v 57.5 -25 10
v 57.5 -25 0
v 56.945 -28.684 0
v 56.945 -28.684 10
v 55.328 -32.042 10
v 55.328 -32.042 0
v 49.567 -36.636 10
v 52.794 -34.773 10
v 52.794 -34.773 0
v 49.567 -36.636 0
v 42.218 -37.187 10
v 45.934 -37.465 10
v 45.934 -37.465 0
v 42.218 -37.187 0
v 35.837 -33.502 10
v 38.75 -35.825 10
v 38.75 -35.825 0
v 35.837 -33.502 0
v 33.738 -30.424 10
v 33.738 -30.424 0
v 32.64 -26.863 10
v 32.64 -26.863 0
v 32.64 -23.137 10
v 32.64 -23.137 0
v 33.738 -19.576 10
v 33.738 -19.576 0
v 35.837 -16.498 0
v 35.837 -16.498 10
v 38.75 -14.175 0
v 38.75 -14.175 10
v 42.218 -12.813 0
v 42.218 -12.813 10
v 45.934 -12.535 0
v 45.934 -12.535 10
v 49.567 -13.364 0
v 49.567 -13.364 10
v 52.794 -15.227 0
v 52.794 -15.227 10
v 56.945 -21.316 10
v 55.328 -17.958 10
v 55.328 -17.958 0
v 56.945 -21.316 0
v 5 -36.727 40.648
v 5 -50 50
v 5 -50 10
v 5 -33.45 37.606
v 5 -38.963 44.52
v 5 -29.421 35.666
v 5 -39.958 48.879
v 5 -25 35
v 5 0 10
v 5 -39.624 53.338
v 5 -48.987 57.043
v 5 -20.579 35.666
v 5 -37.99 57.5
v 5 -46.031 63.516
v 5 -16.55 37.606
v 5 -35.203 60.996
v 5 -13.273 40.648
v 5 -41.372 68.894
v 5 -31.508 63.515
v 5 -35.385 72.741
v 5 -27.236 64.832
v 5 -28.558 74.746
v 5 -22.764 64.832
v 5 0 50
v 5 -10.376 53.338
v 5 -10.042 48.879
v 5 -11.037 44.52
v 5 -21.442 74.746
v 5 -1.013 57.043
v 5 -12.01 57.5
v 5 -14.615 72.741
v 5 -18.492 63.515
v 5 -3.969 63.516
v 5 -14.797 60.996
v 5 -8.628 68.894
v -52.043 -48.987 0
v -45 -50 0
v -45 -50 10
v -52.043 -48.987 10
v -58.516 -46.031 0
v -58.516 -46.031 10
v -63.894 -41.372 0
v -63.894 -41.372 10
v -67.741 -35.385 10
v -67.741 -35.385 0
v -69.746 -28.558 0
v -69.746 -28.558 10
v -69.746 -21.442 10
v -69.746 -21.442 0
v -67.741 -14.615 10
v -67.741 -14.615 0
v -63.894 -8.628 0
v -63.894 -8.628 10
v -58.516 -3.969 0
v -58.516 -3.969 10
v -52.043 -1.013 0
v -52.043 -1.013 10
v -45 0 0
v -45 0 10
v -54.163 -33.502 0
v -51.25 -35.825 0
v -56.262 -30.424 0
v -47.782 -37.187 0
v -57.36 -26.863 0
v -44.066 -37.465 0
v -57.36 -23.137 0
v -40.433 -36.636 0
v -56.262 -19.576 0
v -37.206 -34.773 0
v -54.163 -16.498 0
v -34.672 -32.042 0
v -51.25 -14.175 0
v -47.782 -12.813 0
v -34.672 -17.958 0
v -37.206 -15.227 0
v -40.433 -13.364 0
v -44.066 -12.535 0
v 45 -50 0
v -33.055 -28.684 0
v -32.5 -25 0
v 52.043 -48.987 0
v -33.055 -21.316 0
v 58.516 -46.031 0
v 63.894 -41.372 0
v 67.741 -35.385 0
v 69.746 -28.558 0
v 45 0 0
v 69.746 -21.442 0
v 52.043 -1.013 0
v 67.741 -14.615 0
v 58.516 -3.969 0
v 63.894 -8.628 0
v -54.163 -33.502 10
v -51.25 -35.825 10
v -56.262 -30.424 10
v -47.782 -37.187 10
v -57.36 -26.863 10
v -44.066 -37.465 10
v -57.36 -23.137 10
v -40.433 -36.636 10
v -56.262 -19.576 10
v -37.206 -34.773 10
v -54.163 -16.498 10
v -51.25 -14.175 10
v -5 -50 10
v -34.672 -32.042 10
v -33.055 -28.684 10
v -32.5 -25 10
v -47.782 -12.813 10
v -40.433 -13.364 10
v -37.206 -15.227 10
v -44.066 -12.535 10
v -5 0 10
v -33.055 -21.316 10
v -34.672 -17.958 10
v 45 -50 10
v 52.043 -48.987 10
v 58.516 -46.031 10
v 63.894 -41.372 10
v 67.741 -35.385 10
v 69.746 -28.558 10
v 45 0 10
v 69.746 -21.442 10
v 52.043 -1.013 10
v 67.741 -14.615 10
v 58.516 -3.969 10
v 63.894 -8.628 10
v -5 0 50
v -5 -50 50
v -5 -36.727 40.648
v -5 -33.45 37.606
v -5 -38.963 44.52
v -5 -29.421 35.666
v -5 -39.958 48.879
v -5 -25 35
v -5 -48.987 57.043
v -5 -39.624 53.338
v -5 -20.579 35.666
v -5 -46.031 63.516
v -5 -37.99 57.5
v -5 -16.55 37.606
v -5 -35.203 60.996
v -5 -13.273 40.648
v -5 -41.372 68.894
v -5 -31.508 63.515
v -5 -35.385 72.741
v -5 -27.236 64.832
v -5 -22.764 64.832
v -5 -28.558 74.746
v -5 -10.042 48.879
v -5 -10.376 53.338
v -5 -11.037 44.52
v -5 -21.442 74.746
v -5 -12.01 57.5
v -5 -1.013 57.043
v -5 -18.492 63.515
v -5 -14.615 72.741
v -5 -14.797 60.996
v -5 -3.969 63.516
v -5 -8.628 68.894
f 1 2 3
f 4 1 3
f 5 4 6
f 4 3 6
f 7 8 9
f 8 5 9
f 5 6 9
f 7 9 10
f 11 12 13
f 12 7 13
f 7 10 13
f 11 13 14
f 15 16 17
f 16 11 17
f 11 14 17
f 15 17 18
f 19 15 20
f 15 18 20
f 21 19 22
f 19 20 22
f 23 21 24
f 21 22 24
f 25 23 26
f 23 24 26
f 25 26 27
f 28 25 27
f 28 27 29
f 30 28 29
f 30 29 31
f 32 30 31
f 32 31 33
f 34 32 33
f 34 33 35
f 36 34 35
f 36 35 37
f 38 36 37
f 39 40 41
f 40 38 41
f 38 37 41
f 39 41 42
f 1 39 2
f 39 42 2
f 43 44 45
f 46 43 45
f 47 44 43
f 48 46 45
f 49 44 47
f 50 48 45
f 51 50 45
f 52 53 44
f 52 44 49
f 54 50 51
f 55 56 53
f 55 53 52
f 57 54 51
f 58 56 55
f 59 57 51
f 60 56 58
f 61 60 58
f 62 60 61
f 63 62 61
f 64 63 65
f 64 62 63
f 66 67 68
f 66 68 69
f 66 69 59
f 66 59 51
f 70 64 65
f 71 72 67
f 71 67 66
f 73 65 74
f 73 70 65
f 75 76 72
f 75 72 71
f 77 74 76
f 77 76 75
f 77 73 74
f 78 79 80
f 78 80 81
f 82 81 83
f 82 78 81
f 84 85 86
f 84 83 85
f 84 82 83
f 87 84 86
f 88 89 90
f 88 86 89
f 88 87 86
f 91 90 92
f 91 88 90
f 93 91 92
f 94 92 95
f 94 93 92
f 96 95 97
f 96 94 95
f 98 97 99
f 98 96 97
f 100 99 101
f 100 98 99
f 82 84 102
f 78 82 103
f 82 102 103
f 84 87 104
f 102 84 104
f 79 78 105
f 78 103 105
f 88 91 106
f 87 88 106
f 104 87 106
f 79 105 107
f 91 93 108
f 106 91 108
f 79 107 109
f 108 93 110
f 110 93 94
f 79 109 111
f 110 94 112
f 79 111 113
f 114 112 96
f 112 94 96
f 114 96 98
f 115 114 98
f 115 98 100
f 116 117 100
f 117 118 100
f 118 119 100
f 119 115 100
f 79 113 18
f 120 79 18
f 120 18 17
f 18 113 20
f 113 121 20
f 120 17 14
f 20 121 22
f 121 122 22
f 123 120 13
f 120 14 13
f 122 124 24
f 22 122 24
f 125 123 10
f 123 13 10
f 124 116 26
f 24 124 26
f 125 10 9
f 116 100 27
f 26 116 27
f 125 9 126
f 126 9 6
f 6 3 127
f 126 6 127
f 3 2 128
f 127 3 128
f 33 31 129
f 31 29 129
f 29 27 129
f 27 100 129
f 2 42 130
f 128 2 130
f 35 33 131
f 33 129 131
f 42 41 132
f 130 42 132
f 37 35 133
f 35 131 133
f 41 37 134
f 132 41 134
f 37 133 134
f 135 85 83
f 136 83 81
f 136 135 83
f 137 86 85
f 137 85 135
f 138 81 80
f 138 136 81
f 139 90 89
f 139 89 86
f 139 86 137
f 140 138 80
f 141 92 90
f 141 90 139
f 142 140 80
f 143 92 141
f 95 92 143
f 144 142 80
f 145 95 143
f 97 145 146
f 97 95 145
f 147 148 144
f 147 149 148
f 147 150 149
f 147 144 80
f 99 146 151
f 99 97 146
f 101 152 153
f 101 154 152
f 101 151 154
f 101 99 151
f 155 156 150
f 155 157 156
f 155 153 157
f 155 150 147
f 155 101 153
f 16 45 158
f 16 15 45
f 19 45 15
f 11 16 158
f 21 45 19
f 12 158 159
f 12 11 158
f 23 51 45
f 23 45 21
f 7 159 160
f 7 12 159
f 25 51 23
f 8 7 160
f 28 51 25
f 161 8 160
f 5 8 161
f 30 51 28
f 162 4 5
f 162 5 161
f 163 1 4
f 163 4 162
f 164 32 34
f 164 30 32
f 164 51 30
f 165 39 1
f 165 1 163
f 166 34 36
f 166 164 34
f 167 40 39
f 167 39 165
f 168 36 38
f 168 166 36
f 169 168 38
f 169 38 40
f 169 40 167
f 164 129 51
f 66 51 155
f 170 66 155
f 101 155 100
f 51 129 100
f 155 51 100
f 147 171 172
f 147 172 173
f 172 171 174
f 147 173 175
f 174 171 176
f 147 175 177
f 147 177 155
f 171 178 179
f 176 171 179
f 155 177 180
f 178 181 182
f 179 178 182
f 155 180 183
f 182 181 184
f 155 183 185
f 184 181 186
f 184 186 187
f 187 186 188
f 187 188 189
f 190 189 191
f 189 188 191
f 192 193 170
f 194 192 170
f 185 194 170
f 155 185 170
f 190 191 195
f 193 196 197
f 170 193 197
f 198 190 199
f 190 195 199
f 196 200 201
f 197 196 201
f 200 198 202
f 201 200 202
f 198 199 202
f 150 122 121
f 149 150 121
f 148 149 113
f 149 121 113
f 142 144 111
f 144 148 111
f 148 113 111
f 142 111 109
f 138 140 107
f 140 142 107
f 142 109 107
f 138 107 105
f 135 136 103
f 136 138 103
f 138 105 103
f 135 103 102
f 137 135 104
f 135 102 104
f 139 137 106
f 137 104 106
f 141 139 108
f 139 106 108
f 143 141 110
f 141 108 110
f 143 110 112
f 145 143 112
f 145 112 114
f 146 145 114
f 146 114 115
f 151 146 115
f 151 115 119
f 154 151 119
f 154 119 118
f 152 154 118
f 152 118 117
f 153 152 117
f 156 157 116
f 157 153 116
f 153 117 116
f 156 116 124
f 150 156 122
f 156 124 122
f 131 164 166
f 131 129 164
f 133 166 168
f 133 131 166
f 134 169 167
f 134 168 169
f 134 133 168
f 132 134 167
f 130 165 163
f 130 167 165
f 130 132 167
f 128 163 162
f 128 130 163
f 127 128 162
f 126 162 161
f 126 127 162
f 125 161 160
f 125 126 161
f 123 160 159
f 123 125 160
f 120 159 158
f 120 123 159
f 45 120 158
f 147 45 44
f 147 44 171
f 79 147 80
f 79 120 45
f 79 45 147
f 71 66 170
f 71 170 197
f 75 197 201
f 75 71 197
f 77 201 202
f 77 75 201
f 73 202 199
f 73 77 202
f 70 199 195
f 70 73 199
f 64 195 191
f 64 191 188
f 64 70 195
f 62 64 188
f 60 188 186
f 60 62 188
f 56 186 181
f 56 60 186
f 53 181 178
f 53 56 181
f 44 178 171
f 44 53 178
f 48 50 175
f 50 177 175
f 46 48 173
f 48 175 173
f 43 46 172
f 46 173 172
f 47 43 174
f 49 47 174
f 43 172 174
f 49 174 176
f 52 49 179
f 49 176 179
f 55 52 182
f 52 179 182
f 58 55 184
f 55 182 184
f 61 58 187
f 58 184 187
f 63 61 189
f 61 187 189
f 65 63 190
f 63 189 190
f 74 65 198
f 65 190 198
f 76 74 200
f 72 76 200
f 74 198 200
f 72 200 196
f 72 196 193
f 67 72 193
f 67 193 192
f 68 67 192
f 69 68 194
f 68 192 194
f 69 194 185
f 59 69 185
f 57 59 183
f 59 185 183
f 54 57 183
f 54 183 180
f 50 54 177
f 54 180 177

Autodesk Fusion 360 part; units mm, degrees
sketch "Sketch1" plane through (0, 0, 0) normal (0, 0, 1) x (1, 0, 0)
  line L0 (-5, 0) -> (-5, -50)
  line L1 (5, 0) -> (5, -50)
  line L2 (5, 0) -> (45, 0)
  line L3 (-5, 0) -> (-45, 0)
  line L4 (5, -50) -> (45, -50)
  line L5 (-5, -50) -> (-45, -50)
  line L6 (70, -25) -> (70.7973, -25) construction
  circle A0 centre (-45, -25) radius 12.5
  circle A1 centre (45, -25) radius 12.5
  arc A2 (-45, 0) -> (-45, -50) centre (-45, -25) ccw
  arc A3 (45, -50) -> (45, 0) centre (45, -25) ccw
  line L7 (-5, 0) -> (5, 0)
  line L8 (-5, -50) -> (5, -50)
  dimension "d4" = 40
  dimension "d5" = 40
  dimension "d6" = 40
  dimension "d7" = 40
  dimension "d8" = 25
  dimension "d9" = 50
  dimension "d10" = 25
  dimension "d11" = 50
extrude "Extrude1" add sketch "Sketch1" along normal blind 10 contours L0 L3 L5 A2 | L1 L2 L4 A3 makes body 1 at (-14.1667, -25, 0) makes body 2 at (14.1667, -25, 0)
extrude "Extrude2" add sketch "Sketch1" along normal blind 50 contours L0 L1 L7 L8 bodies 1 2
sketch "Sketch2" plane through (5, 0, 0) normal (1, 0, 0) x (0, 1, 0)
  line L0 (-50, 10) -> (0, 10)
  line L1 (0, 10) -> (0, 50)
  line L2 (0, 50) -> (-50, 50)
  line L3 (-50, 50) -> (-50, 10)
  arc A0 (0, 50) -> (-50, 50) centre (-25, 50) ccw
  circle A1 centre (-25, 50) radius 12.5
  dimension "d16" = 50
  dimension "d17" = 25
extrude "Extrude3" add sketch "Sketch2" against normal blind 10 contours L2 A0 A1 bodies 1
hole "Hole1" at (5, -25, 50) direction (-1, 0, 0) diameter 30 depth 30 tip angle 118 bodies 1
